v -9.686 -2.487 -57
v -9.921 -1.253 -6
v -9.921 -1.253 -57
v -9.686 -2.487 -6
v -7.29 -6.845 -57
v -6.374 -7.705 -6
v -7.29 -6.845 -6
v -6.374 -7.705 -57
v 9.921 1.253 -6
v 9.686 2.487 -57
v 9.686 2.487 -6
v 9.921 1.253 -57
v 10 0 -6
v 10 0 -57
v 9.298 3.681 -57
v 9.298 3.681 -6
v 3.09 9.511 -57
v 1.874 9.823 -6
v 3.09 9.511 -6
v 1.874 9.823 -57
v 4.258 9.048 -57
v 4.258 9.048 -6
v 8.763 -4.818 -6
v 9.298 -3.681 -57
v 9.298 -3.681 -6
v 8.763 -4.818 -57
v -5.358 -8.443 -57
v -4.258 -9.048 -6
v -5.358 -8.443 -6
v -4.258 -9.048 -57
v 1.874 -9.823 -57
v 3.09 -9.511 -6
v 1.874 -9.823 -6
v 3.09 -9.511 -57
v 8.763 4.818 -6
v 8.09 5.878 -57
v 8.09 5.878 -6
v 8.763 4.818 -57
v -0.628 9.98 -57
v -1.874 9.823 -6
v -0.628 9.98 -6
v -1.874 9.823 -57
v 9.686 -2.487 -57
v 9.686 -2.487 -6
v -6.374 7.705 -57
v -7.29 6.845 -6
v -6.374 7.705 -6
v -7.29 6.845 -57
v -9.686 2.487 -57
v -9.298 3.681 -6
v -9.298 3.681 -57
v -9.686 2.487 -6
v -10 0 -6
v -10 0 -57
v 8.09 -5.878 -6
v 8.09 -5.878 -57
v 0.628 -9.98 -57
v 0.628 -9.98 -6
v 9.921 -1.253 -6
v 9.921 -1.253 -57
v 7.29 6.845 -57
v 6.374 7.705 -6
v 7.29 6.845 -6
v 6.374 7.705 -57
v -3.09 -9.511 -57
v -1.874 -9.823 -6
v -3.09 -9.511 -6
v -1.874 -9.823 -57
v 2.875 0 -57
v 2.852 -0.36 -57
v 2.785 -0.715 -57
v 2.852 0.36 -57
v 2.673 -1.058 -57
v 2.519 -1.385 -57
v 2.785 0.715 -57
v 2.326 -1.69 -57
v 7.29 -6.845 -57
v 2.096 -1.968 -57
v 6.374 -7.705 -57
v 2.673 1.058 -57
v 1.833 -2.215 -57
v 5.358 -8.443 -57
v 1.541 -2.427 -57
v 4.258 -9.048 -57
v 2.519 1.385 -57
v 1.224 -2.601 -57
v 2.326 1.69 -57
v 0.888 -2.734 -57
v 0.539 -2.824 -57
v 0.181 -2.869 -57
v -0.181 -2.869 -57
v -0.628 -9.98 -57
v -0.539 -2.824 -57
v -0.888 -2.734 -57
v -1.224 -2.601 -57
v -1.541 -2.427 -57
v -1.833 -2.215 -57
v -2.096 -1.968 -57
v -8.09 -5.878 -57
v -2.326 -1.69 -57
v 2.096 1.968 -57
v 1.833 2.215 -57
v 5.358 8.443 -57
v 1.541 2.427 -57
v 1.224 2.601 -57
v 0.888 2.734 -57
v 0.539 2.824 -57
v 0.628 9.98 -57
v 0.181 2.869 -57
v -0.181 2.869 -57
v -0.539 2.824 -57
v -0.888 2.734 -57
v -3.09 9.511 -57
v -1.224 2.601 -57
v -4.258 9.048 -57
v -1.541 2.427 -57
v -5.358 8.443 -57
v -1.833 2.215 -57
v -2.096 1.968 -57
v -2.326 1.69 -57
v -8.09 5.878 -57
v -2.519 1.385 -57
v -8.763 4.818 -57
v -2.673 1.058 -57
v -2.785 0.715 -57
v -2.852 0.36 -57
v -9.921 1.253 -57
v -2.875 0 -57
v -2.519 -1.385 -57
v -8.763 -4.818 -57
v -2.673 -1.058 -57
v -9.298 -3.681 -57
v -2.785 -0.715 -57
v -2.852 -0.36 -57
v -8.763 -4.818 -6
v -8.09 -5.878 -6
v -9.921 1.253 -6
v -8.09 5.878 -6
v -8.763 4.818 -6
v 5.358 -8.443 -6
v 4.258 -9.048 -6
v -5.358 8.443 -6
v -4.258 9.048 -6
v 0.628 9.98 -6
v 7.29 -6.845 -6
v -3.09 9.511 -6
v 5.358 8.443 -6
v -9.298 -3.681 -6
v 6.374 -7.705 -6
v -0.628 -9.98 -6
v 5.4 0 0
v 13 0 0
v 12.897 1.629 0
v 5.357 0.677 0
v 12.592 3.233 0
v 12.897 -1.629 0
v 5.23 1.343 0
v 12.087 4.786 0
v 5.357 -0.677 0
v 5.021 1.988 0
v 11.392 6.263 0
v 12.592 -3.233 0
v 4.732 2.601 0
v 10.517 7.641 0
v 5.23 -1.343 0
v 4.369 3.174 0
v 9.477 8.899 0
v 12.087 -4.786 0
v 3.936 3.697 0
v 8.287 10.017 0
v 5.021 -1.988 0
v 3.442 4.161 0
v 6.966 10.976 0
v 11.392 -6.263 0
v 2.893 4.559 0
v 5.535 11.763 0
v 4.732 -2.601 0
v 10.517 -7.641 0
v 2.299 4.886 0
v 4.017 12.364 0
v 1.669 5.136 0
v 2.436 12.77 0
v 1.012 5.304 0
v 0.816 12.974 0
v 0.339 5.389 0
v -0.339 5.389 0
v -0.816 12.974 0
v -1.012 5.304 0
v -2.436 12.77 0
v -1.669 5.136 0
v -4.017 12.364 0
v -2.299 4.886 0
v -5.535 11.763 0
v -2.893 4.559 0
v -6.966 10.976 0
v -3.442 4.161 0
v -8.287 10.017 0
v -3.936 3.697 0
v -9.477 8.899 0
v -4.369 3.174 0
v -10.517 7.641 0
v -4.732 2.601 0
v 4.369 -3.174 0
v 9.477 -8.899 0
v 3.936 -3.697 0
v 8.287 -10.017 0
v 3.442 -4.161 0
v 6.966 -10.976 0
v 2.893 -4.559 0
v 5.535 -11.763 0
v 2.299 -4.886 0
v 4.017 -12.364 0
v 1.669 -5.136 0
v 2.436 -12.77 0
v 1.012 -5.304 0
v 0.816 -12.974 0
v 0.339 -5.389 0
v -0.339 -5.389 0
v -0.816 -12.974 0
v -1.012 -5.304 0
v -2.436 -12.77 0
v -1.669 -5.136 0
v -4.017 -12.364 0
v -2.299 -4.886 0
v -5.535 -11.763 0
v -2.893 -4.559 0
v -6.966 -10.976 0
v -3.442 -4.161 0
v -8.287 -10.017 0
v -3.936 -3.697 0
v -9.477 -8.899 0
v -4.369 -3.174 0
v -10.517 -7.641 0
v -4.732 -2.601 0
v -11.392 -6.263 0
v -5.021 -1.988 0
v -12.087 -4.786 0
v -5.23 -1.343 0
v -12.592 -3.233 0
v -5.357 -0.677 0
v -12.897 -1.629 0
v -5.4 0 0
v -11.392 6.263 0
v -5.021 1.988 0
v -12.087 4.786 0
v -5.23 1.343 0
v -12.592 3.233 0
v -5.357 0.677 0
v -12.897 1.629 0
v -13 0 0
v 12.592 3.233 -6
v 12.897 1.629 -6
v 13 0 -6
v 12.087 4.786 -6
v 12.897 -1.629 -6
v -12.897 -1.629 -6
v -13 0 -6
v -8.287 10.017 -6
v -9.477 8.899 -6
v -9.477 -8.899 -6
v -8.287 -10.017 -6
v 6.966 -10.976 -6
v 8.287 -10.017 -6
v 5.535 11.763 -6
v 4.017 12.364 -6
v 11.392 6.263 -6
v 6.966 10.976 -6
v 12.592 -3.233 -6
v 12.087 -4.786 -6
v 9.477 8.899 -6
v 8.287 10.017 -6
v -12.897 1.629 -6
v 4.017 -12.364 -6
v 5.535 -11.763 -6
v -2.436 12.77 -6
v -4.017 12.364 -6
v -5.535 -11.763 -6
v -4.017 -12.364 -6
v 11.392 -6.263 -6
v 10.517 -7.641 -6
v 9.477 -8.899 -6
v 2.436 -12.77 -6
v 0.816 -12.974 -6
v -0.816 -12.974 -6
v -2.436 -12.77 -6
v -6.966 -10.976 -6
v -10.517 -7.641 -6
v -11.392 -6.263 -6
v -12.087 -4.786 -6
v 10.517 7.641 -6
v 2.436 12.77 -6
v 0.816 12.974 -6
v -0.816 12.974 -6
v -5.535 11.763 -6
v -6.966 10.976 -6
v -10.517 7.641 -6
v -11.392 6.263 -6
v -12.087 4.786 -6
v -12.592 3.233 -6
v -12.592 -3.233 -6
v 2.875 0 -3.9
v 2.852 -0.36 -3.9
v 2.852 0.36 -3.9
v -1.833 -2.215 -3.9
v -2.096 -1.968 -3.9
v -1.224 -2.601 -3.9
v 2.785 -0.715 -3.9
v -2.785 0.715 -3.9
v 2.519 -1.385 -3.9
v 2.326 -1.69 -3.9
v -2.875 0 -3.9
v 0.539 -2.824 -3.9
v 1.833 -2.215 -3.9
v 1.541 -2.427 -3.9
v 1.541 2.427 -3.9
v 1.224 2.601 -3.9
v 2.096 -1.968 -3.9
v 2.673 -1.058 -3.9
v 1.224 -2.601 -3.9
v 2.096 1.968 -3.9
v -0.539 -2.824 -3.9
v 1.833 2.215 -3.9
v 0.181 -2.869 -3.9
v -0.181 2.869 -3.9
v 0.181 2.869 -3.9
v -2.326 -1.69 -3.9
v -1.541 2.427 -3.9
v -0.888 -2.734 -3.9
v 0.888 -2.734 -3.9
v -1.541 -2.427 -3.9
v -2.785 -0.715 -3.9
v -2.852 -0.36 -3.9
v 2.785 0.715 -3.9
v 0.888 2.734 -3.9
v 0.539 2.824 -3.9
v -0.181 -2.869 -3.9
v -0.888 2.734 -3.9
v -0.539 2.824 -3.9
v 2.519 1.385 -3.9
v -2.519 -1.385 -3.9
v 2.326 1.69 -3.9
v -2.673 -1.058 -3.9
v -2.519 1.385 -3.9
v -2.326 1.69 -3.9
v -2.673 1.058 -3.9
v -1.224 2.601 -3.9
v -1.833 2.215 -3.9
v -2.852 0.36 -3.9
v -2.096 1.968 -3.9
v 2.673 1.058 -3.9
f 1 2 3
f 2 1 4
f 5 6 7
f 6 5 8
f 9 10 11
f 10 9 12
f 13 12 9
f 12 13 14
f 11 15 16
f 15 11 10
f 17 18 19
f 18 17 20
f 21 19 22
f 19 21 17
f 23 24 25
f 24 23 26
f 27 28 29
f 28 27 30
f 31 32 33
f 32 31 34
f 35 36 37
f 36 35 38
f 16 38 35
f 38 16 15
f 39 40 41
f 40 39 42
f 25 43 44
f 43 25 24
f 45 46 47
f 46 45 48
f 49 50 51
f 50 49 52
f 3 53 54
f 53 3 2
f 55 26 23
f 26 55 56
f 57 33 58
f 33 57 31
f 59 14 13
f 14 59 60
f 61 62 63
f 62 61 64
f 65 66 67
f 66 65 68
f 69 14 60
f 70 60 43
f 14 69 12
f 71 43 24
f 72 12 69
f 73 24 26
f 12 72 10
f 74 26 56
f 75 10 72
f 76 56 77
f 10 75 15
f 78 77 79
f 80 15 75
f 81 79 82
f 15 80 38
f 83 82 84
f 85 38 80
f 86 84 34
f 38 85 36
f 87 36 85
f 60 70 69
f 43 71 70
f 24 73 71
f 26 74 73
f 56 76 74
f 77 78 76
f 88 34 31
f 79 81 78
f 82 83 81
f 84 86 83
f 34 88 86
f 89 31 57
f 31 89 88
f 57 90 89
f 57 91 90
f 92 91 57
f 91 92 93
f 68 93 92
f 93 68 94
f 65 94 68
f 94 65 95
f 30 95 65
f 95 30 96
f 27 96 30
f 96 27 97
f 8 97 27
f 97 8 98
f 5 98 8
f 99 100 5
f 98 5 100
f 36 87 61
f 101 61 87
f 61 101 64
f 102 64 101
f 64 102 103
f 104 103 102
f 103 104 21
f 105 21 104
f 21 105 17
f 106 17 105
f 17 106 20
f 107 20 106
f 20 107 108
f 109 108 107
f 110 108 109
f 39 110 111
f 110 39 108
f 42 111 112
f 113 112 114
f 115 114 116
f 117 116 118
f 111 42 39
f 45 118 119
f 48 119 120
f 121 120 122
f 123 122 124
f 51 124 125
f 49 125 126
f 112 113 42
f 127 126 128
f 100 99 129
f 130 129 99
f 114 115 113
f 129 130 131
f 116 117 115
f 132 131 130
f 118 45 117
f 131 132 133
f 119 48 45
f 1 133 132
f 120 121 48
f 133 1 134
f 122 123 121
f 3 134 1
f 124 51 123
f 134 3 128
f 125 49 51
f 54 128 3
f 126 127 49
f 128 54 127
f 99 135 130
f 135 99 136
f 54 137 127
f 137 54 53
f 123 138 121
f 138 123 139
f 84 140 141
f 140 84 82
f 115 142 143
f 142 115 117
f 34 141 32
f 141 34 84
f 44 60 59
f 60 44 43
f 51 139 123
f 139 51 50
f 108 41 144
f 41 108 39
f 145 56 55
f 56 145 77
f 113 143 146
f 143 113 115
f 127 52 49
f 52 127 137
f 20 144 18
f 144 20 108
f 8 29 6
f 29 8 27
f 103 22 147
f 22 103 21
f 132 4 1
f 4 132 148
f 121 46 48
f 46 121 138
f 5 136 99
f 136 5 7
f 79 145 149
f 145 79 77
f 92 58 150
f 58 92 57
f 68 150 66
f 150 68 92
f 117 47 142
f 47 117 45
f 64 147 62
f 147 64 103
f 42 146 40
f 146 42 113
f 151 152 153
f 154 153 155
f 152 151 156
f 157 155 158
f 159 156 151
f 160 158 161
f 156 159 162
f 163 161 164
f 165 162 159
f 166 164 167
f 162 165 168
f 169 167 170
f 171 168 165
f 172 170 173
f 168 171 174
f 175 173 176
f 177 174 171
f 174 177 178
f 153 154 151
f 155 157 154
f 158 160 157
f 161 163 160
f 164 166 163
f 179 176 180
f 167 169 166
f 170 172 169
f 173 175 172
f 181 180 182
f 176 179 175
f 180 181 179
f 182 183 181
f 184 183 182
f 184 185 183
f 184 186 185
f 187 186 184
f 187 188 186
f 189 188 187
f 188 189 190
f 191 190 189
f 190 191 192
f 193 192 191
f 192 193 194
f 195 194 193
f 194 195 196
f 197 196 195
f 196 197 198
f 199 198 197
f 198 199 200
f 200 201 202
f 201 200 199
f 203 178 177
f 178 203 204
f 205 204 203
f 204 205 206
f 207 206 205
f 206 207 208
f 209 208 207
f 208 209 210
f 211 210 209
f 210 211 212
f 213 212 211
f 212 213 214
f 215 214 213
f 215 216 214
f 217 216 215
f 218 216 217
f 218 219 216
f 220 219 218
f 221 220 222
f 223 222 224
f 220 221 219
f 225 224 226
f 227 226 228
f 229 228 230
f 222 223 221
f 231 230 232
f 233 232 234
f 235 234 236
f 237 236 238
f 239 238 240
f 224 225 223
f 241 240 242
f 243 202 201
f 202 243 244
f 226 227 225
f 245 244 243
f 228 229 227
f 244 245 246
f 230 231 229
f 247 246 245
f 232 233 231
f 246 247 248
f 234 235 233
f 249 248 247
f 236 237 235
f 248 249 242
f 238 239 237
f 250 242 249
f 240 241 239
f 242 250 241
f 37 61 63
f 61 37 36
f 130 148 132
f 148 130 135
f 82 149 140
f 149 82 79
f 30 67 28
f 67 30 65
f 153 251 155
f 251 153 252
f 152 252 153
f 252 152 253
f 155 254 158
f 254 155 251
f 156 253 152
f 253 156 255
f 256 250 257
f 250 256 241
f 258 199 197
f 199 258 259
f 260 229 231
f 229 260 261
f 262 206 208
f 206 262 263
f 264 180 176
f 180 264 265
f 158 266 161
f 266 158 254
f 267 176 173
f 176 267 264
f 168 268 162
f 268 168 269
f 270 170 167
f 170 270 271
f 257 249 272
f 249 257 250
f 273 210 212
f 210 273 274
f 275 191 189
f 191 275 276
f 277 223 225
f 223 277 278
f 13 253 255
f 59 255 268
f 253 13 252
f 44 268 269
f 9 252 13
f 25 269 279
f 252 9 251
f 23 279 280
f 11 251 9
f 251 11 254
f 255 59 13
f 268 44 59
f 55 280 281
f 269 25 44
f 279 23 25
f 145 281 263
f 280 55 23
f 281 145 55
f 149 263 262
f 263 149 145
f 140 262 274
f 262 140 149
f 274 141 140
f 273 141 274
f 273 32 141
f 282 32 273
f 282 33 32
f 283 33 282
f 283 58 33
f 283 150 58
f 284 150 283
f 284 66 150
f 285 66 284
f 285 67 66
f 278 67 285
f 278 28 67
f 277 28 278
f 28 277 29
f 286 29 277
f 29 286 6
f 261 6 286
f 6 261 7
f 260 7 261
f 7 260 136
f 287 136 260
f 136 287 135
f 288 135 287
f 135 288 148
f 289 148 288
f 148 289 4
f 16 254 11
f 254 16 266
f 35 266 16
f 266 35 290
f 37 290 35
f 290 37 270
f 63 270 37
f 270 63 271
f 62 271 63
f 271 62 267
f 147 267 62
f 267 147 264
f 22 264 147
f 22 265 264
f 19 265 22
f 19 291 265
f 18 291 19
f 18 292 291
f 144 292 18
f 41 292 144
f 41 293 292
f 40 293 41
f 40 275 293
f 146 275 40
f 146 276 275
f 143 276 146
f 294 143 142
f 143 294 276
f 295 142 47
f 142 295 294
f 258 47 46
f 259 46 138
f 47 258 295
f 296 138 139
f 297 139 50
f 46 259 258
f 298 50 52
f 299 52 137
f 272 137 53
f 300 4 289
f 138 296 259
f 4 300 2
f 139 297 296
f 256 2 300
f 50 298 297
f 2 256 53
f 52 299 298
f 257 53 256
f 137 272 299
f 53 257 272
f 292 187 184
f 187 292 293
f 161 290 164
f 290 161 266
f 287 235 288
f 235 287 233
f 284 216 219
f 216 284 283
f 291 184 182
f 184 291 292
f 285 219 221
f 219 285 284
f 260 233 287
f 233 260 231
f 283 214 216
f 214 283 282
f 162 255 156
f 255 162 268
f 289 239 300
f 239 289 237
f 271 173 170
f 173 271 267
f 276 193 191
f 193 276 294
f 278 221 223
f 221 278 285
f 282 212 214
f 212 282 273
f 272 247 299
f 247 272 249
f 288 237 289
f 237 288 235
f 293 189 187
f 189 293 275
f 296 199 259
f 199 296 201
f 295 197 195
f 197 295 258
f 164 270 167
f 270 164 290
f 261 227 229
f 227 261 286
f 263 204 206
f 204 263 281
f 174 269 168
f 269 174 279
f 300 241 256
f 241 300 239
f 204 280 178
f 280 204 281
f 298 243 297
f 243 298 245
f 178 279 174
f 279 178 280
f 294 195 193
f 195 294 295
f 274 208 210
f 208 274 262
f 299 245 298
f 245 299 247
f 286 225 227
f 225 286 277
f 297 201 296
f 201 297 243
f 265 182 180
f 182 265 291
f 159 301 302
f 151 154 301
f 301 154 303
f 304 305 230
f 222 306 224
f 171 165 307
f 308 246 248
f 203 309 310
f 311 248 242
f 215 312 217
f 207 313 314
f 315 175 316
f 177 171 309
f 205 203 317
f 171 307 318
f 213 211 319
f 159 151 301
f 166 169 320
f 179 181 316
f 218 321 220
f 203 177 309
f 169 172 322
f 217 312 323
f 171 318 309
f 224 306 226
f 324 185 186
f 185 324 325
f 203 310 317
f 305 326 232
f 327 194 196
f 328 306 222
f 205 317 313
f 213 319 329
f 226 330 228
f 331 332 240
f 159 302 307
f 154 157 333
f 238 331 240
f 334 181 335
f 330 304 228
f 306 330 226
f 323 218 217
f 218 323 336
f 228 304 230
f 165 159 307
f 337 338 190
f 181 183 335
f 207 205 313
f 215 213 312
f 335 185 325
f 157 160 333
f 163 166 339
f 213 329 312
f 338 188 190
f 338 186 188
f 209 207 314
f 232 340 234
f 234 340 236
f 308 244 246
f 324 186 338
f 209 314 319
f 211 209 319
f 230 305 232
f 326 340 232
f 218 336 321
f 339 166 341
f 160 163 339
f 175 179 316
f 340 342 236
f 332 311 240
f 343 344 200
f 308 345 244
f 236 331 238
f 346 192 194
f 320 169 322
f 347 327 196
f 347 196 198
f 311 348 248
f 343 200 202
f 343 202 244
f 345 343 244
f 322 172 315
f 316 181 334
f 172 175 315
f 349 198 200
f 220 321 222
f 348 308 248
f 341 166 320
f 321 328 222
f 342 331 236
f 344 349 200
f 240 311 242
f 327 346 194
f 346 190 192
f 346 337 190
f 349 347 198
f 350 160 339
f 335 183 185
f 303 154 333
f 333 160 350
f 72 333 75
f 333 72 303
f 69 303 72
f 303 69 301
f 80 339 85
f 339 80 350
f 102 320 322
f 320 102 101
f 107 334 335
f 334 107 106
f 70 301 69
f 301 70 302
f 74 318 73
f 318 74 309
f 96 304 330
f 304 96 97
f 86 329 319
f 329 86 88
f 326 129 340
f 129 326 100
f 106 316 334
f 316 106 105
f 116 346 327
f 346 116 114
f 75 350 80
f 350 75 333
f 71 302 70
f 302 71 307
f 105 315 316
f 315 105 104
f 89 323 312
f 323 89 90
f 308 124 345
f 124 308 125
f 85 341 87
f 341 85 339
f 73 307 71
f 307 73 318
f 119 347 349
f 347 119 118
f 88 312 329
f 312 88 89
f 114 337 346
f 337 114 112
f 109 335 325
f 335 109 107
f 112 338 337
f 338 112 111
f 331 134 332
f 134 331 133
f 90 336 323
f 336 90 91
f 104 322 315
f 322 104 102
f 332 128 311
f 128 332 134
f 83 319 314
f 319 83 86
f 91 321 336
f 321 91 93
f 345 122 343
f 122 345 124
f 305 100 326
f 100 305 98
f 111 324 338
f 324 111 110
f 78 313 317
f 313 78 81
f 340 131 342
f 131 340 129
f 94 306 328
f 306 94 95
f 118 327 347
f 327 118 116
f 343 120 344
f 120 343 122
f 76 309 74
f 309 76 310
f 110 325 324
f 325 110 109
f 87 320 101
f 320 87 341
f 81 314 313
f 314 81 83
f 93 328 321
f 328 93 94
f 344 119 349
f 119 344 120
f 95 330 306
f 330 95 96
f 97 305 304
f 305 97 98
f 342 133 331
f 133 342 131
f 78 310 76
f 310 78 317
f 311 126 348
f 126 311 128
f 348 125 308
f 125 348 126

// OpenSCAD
$fn = 50;


difference() {
	union() {
		translate(v = [0, 0, -57.0000000000]) {
			cylinder(h = 57, r = 10.0000000000);
		}
		translate(v = [0, 0, -6.0000000000]) {
			cylinder(h = 6, r = 13.0000000000);
		}
	}
	union() {
		translate(v = [0, 0, 0]) {
			rotate(a = [0, 0, 0]) {
				difference() {
					union() {
						#translate(v = [0, 0, -57.0000000000]) {
							cylinder(h = 57, r = 2.6000000000);
						}
						#translate(v = [0, 0, -3.9000000000]) {
							cylinder(h = 3.9000000000, r1 = 2.8750000000, r2 = 5.4000000000);
						}
						#translate(v = [0, 0, -57.0000000000]) {
							cylinder(h = 57, r = 2.8750000000);
						}
						#translate(v = [0, 0, -57.0000000000]) {
							cylinder(h = 57, r = 2.6000000000);
						}
					}
					union();
				}
			}
		}
	}
}
